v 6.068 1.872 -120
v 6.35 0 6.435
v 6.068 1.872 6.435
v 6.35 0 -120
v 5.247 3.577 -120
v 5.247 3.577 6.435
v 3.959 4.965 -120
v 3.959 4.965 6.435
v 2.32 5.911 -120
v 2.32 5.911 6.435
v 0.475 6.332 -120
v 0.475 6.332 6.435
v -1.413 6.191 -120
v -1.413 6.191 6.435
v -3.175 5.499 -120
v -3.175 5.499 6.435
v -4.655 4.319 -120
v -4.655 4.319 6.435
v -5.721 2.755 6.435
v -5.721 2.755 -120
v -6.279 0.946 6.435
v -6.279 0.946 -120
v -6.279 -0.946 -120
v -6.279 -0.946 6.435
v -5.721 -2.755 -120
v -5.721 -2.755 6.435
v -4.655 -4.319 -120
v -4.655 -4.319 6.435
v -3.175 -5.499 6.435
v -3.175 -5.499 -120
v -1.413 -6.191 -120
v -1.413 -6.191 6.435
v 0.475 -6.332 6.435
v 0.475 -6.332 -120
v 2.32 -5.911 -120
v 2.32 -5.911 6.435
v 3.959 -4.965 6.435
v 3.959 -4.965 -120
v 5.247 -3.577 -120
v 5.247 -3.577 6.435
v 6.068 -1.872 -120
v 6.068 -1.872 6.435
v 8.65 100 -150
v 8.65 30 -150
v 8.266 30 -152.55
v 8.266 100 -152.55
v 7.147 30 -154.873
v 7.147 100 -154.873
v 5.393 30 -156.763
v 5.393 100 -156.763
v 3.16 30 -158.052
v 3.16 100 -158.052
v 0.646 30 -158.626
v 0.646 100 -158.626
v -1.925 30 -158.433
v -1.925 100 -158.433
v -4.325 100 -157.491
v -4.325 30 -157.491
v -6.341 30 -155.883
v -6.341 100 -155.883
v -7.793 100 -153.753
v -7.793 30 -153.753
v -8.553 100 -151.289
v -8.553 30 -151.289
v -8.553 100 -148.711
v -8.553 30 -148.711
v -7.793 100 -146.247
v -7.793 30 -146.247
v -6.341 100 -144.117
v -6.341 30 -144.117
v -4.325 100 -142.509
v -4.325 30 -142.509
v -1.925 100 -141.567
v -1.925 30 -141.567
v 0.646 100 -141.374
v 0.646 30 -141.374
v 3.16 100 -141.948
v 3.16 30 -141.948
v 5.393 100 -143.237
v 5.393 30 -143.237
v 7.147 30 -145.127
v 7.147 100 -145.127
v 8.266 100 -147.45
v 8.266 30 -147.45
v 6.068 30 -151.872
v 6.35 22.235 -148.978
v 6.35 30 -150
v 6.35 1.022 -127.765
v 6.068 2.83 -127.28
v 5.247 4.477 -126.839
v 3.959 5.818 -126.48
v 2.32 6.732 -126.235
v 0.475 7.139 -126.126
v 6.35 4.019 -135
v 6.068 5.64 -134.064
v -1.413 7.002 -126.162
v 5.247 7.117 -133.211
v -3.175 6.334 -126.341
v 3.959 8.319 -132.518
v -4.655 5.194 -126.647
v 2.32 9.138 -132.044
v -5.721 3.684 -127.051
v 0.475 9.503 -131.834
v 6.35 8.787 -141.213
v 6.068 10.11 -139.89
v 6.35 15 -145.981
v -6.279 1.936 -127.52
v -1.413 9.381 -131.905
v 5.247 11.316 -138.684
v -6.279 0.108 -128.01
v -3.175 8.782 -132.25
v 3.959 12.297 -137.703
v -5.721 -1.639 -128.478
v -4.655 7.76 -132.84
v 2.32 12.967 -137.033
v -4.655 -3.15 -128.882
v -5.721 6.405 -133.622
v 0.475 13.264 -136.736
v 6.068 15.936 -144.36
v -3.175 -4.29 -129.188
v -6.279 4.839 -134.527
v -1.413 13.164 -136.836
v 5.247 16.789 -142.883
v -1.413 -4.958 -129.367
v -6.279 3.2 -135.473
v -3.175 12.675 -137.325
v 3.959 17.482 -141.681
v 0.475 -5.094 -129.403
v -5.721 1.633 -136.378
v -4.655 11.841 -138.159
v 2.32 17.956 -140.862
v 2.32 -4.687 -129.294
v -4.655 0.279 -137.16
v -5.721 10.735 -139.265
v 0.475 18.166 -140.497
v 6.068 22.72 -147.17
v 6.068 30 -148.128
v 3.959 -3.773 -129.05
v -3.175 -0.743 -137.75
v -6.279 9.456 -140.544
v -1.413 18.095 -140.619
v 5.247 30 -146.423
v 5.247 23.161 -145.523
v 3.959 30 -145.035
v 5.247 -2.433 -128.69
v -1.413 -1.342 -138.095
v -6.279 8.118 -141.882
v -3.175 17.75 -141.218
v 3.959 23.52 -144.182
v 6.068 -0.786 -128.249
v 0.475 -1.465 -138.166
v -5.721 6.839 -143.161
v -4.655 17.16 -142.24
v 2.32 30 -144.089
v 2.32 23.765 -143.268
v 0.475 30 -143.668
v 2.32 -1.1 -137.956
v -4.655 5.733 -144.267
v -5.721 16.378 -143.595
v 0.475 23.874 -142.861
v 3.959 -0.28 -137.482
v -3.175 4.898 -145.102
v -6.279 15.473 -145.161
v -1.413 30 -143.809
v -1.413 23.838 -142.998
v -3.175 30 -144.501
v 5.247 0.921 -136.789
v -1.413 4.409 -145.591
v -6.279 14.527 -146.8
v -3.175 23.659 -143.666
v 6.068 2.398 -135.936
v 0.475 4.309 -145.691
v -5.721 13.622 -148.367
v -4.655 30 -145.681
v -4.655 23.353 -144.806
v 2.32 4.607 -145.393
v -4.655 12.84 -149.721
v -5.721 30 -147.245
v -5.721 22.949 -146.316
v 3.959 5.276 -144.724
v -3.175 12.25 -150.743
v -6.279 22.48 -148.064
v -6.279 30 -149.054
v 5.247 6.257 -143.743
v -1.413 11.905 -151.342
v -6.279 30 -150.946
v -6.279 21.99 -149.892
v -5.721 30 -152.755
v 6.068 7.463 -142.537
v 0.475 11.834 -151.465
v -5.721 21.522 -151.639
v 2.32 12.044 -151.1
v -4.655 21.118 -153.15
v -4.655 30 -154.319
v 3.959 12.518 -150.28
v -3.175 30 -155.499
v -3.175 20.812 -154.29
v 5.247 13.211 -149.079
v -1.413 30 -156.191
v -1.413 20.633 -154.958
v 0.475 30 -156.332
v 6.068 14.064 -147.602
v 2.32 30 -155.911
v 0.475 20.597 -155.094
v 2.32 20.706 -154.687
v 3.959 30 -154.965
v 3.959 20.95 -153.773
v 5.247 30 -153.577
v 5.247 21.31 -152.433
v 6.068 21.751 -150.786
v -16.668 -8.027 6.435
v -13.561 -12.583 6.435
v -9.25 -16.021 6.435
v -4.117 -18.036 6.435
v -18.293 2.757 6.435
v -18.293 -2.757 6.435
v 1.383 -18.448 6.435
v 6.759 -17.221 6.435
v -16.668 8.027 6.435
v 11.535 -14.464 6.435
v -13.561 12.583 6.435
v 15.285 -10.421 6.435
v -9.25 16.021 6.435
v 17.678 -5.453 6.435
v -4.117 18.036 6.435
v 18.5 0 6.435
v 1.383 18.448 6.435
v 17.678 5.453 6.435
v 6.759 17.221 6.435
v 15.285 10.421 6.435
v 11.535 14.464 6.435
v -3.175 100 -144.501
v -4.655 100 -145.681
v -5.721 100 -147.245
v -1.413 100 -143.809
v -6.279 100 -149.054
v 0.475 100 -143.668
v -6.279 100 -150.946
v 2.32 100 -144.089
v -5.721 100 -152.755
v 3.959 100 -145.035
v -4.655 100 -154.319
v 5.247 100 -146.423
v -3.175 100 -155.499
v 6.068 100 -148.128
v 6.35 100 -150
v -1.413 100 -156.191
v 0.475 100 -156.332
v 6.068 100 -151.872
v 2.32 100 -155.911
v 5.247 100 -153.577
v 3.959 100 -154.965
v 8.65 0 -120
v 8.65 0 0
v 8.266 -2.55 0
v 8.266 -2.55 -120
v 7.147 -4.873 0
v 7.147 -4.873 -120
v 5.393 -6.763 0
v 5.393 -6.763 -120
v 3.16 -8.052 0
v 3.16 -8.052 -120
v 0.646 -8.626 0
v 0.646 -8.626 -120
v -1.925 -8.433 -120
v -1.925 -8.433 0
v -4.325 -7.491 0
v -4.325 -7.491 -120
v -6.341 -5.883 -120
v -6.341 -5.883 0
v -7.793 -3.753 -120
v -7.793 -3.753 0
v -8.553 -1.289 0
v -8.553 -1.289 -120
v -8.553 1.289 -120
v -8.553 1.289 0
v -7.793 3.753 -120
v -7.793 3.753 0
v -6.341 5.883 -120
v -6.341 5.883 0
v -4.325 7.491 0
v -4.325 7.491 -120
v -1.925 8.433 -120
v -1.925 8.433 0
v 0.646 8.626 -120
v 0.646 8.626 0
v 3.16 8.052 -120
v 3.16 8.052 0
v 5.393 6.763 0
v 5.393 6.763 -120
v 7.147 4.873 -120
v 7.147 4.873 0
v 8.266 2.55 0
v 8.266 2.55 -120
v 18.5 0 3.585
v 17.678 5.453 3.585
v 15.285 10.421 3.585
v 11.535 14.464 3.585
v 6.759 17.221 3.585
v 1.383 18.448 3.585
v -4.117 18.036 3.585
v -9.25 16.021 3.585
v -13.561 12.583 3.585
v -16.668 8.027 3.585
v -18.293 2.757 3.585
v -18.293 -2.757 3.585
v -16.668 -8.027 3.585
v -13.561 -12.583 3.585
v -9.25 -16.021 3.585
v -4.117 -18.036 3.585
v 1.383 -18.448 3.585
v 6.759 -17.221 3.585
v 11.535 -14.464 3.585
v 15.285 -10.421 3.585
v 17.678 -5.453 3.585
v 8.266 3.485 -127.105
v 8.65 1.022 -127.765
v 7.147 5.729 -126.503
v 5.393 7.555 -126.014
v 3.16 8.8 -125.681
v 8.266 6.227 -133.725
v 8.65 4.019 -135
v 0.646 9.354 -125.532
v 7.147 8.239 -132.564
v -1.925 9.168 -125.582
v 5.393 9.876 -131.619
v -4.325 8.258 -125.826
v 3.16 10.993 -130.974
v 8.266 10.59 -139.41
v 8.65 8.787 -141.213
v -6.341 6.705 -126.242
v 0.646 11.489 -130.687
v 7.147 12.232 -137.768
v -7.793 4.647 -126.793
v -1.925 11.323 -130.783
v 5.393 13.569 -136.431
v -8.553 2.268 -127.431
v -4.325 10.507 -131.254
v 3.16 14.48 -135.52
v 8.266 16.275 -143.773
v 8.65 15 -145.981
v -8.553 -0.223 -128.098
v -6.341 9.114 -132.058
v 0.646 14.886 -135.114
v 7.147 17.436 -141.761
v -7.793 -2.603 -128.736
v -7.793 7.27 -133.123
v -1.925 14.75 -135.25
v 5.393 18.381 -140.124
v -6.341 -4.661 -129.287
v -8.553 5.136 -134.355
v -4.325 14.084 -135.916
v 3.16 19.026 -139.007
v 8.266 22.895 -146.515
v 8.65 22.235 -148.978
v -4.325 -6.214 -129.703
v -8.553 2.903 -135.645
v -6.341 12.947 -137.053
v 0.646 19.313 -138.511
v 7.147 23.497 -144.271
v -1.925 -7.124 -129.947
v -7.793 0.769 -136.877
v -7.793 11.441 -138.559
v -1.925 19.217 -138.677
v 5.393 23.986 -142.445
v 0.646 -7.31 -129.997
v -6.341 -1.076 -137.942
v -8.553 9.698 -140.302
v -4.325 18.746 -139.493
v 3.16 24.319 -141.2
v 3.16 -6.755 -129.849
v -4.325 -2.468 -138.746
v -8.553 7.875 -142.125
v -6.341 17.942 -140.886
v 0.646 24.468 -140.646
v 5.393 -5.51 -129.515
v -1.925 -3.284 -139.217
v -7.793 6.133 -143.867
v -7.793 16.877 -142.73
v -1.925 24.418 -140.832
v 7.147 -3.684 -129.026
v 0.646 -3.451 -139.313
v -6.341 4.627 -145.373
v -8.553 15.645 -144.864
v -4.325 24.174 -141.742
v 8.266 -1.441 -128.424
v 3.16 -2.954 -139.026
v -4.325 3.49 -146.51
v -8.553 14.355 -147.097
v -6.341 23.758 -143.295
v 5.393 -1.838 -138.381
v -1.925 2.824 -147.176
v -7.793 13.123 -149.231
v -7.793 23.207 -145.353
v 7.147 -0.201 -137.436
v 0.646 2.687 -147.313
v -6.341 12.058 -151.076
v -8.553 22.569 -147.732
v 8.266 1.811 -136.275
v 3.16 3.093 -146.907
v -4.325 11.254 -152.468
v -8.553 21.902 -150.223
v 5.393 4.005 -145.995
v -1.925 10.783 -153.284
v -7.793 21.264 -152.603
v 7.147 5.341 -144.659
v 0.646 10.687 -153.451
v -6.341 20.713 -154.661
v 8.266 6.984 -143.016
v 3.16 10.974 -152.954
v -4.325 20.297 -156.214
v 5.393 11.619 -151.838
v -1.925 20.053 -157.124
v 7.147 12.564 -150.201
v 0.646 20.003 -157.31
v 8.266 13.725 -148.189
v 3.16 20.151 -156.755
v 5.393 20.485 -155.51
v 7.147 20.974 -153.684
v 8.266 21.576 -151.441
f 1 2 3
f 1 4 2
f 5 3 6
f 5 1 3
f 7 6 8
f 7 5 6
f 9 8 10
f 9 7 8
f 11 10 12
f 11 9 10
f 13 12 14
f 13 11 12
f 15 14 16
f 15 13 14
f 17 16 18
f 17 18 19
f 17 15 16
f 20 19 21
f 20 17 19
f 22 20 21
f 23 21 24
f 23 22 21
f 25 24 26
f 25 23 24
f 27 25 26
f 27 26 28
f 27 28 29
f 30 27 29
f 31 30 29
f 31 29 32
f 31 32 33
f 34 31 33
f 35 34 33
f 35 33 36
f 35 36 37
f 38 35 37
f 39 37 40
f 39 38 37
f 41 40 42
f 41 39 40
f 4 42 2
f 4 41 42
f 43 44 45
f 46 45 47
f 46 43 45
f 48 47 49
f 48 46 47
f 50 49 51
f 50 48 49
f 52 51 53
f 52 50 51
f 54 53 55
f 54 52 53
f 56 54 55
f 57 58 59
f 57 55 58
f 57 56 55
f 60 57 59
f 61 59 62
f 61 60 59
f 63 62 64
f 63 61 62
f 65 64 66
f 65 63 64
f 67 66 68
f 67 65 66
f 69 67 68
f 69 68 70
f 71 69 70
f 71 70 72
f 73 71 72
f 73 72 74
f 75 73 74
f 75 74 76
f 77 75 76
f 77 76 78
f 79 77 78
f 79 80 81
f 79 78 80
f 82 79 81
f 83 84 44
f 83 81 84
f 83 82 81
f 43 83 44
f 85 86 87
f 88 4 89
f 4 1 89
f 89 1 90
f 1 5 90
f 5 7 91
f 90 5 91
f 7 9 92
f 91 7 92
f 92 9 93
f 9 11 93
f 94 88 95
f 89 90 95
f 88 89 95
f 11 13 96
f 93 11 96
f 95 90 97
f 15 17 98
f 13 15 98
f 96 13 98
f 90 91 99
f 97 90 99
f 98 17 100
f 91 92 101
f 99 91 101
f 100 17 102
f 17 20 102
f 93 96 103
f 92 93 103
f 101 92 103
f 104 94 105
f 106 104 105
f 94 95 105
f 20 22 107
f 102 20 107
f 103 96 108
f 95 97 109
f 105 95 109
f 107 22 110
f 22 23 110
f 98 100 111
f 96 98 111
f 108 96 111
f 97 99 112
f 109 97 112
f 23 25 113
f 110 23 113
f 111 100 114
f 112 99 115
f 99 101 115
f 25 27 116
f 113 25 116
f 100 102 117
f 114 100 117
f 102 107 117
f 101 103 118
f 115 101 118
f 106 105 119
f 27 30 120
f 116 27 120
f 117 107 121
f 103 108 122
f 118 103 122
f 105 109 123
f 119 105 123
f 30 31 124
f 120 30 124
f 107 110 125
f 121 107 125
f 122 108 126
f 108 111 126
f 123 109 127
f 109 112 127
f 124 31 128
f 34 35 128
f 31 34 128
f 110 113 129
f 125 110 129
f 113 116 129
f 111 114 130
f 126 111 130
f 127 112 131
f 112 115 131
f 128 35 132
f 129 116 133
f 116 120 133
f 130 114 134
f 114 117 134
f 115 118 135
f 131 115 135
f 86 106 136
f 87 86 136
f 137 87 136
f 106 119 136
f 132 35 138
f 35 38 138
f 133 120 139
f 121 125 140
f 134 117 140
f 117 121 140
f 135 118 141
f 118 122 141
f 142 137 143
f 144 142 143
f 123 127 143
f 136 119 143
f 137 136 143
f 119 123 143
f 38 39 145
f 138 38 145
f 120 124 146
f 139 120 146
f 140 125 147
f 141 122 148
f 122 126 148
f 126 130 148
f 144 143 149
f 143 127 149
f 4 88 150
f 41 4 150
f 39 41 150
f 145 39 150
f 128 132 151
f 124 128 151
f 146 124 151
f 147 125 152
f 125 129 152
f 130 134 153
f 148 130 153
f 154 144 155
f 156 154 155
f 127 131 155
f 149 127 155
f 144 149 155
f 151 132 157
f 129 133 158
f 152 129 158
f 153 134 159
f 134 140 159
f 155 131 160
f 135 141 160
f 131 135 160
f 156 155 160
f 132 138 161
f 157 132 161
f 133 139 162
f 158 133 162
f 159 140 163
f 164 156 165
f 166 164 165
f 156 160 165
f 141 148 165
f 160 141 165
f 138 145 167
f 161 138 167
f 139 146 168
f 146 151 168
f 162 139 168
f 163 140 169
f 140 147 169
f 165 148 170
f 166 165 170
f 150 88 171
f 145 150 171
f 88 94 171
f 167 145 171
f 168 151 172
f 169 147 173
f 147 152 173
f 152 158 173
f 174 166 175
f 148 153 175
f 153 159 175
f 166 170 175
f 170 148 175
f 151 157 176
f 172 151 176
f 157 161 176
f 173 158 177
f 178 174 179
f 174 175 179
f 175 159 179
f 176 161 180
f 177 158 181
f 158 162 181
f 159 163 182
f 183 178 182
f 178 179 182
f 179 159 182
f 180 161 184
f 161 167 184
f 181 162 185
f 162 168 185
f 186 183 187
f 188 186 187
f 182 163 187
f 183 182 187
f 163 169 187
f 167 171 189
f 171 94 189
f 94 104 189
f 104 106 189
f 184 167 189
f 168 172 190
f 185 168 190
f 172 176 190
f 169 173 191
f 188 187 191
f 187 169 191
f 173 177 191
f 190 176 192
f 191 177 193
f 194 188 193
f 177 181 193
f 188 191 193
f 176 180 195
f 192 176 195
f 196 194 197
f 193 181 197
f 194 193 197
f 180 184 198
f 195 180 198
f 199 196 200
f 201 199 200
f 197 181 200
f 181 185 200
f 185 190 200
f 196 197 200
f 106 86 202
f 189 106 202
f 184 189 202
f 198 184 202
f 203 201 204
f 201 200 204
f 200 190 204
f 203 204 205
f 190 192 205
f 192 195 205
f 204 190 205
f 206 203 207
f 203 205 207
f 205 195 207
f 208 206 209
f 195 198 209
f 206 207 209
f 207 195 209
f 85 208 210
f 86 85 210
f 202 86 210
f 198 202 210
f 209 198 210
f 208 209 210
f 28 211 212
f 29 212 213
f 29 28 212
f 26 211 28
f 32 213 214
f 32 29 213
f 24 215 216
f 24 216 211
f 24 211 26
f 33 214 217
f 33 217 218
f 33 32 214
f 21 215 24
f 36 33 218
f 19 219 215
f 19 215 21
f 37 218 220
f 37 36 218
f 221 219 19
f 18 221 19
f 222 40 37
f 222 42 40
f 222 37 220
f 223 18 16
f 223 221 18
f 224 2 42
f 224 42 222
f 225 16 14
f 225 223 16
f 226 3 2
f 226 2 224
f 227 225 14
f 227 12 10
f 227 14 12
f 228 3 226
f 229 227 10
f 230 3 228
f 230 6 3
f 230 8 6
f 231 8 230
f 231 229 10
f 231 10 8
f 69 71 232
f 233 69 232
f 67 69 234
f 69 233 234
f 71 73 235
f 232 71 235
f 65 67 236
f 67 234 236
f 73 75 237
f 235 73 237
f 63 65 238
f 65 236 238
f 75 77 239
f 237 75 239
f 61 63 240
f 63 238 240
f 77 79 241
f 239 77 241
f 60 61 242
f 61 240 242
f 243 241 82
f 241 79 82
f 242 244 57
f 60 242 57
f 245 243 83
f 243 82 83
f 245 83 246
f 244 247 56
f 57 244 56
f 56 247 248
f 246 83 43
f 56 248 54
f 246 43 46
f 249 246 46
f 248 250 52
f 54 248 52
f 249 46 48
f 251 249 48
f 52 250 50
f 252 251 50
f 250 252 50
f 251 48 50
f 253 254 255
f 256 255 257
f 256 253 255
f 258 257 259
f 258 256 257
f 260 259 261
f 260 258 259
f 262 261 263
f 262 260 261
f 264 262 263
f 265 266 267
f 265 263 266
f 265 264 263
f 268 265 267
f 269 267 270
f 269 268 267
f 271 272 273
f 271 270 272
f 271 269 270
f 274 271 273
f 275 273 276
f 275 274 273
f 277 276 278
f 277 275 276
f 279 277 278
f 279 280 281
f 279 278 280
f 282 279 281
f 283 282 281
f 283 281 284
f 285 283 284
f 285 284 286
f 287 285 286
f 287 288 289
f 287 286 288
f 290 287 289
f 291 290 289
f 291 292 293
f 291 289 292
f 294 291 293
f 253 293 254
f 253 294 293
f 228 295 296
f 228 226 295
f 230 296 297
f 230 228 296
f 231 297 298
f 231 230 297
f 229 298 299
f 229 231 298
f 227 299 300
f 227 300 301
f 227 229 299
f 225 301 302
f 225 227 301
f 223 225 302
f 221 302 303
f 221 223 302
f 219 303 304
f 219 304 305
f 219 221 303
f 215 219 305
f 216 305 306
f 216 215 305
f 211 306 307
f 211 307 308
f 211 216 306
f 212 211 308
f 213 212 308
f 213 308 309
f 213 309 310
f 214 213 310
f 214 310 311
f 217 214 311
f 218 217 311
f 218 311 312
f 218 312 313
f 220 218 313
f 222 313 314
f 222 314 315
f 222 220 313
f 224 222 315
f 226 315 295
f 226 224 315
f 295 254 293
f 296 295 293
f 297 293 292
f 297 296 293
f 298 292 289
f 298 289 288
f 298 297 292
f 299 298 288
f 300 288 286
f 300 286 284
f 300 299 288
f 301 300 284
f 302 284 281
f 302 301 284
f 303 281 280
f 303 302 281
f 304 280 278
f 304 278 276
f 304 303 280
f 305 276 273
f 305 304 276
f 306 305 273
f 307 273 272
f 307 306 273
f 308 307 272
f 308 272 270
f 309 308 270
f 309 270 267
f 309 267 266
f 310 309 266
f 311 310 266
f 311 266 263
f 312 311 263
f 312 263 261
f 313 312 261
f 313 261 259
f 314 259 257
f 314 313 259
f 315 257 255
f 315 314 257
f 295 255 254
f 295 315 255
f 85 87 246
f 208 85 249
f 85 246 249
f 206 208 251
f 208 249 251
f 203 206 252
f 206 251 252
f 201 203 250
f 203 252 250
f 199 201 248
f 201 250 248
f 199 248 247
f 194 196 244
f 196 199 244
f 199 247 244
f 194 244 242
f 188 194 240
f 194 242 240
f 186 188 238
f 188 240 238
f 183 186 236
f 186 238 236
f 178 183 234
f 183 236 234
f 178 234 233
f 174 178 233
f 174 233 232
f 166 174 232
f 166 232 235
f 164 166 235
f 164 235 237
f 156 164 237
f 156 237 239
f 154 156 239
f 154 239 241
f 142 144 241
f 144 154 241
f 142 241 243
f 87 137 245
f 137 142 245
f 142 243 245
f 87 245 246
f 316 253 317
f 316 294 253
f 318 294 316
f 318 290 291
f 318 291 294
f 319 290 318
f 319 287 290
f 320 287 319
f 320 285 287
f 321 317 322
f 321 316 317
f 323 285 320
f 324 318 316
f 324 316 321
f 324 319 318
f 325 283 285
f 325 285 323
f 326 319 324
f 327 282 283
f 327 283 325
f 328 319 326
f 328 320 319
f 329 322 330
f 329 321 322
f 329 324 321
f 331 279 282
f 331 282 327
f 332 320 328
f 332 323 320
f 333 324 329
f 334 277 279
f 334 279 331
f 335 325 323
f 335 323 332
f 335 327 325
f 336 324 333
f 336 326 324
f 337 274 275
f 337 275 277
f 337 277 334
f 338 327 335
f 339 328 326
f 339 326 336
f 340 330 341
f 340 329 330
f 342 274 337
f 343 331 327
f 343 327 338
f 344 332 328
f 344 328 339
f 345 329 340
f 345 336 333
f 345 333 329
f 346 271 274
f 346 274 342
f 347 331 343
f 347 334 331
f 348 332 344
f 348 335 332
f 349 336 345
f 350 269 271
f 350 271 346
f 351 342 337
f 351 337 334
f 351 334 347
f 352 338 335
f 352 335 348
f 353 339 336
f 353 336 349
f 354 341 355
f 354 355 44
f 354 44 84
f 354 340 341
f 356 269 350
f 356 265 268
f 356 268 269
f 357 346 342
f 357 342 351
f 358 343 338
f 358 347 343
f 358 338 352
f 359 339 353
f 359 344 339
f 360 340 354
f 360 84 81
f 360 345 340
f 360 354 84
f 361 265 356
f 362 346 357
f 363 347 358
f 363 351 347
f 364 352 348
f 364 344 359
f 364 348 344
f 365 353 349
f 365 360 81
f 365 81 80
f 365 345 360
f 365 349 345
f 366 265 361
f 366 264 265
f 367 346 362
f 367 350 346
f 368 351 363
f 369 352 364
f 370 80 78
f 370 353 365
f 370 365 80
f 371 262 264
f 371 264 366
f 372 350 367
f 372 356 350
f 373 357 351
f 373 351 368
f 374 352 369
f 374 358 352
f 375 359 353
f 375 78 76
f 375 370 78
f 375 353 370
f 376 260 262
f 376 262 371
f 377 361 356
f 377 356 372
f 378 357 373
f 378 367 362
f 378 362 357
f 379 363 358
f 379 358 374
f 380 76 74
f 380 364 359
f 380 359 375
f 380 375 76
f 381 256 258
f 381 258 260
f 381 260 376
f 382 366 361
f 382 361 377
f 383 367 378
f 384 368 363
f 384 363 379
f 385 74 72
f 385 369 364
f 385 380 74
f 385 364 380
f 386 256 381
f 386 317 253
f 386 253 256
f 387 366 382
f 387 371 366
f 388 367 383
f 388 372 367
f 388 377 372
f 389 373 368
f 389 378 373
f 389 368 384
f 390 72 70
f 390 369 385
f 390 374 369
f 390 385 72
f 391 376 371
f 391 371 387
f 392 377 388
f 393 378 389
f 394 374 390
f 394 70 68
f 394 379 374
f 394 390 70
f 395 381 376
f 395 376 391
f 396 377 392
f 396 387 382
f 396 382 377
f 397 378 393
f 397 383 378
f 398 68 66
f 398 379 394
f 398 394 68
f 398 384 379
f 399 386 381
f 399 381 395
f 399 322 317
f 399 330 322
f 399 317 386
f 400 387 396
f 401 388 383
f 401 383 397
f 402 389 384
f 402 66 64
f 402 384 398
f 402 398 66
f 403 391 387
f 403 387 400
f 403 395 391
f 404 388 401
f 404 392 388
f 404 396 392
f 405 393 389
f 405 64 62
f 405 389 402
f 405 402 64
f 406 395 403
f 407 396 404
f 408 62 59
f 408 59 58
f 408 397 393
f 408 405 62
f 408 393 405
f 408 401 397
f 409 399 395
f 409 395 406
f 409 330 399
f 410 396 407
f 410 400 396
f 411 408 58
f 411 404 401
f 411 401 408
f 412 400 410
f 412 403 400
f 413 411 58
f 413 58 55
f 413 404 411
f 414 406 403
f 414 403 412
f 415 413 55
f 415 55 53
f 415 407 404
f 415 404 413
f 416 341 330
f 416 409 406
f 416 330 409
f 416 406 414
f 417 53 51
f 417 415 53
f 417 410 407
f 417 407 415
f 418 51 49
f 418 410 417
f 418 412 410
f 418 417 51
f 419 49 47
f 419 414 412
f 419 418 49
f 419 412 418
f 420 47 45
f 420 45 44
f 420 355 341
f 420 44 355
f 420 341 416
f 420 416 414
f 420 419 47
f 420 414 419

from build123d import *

# Parameters (mm, degrees)
F2_R   = 8.65
F2_R_2 = 6.35


with BuildPart() as f1:
    # F0 (on Front) → F1 (revolve)
    with BuildSketch(Plane.XZ):
        Polygon((6.35, 6.4351068075), (6.35, 0), (8.65, 0), (18.5, 3.5851068075), (18.5, 6.4351068075), align=None)
    revolve(axis=Axis((0, 0, 5.6449943222), (0, 0, 1)))

    # F4: sweep along a path in F3
    with BuildLine(Plane.YZ) as f4_path:
        Line((0, 0), (0, -120))
        ThreePointArc((0, -120), (8.7867965644, -141.2132034356), (30, -150))
        Line((30, -150), (100, -150))
    # F2 (on Top) → F4 (sweep)
    with BuildSketch(Plane.XY):
        Circle(F2_R)
        Circle(F2_R_2, mode=Mode.SUBTRACT)
    sweep(path=f4_path.line)


solid = f1.part
